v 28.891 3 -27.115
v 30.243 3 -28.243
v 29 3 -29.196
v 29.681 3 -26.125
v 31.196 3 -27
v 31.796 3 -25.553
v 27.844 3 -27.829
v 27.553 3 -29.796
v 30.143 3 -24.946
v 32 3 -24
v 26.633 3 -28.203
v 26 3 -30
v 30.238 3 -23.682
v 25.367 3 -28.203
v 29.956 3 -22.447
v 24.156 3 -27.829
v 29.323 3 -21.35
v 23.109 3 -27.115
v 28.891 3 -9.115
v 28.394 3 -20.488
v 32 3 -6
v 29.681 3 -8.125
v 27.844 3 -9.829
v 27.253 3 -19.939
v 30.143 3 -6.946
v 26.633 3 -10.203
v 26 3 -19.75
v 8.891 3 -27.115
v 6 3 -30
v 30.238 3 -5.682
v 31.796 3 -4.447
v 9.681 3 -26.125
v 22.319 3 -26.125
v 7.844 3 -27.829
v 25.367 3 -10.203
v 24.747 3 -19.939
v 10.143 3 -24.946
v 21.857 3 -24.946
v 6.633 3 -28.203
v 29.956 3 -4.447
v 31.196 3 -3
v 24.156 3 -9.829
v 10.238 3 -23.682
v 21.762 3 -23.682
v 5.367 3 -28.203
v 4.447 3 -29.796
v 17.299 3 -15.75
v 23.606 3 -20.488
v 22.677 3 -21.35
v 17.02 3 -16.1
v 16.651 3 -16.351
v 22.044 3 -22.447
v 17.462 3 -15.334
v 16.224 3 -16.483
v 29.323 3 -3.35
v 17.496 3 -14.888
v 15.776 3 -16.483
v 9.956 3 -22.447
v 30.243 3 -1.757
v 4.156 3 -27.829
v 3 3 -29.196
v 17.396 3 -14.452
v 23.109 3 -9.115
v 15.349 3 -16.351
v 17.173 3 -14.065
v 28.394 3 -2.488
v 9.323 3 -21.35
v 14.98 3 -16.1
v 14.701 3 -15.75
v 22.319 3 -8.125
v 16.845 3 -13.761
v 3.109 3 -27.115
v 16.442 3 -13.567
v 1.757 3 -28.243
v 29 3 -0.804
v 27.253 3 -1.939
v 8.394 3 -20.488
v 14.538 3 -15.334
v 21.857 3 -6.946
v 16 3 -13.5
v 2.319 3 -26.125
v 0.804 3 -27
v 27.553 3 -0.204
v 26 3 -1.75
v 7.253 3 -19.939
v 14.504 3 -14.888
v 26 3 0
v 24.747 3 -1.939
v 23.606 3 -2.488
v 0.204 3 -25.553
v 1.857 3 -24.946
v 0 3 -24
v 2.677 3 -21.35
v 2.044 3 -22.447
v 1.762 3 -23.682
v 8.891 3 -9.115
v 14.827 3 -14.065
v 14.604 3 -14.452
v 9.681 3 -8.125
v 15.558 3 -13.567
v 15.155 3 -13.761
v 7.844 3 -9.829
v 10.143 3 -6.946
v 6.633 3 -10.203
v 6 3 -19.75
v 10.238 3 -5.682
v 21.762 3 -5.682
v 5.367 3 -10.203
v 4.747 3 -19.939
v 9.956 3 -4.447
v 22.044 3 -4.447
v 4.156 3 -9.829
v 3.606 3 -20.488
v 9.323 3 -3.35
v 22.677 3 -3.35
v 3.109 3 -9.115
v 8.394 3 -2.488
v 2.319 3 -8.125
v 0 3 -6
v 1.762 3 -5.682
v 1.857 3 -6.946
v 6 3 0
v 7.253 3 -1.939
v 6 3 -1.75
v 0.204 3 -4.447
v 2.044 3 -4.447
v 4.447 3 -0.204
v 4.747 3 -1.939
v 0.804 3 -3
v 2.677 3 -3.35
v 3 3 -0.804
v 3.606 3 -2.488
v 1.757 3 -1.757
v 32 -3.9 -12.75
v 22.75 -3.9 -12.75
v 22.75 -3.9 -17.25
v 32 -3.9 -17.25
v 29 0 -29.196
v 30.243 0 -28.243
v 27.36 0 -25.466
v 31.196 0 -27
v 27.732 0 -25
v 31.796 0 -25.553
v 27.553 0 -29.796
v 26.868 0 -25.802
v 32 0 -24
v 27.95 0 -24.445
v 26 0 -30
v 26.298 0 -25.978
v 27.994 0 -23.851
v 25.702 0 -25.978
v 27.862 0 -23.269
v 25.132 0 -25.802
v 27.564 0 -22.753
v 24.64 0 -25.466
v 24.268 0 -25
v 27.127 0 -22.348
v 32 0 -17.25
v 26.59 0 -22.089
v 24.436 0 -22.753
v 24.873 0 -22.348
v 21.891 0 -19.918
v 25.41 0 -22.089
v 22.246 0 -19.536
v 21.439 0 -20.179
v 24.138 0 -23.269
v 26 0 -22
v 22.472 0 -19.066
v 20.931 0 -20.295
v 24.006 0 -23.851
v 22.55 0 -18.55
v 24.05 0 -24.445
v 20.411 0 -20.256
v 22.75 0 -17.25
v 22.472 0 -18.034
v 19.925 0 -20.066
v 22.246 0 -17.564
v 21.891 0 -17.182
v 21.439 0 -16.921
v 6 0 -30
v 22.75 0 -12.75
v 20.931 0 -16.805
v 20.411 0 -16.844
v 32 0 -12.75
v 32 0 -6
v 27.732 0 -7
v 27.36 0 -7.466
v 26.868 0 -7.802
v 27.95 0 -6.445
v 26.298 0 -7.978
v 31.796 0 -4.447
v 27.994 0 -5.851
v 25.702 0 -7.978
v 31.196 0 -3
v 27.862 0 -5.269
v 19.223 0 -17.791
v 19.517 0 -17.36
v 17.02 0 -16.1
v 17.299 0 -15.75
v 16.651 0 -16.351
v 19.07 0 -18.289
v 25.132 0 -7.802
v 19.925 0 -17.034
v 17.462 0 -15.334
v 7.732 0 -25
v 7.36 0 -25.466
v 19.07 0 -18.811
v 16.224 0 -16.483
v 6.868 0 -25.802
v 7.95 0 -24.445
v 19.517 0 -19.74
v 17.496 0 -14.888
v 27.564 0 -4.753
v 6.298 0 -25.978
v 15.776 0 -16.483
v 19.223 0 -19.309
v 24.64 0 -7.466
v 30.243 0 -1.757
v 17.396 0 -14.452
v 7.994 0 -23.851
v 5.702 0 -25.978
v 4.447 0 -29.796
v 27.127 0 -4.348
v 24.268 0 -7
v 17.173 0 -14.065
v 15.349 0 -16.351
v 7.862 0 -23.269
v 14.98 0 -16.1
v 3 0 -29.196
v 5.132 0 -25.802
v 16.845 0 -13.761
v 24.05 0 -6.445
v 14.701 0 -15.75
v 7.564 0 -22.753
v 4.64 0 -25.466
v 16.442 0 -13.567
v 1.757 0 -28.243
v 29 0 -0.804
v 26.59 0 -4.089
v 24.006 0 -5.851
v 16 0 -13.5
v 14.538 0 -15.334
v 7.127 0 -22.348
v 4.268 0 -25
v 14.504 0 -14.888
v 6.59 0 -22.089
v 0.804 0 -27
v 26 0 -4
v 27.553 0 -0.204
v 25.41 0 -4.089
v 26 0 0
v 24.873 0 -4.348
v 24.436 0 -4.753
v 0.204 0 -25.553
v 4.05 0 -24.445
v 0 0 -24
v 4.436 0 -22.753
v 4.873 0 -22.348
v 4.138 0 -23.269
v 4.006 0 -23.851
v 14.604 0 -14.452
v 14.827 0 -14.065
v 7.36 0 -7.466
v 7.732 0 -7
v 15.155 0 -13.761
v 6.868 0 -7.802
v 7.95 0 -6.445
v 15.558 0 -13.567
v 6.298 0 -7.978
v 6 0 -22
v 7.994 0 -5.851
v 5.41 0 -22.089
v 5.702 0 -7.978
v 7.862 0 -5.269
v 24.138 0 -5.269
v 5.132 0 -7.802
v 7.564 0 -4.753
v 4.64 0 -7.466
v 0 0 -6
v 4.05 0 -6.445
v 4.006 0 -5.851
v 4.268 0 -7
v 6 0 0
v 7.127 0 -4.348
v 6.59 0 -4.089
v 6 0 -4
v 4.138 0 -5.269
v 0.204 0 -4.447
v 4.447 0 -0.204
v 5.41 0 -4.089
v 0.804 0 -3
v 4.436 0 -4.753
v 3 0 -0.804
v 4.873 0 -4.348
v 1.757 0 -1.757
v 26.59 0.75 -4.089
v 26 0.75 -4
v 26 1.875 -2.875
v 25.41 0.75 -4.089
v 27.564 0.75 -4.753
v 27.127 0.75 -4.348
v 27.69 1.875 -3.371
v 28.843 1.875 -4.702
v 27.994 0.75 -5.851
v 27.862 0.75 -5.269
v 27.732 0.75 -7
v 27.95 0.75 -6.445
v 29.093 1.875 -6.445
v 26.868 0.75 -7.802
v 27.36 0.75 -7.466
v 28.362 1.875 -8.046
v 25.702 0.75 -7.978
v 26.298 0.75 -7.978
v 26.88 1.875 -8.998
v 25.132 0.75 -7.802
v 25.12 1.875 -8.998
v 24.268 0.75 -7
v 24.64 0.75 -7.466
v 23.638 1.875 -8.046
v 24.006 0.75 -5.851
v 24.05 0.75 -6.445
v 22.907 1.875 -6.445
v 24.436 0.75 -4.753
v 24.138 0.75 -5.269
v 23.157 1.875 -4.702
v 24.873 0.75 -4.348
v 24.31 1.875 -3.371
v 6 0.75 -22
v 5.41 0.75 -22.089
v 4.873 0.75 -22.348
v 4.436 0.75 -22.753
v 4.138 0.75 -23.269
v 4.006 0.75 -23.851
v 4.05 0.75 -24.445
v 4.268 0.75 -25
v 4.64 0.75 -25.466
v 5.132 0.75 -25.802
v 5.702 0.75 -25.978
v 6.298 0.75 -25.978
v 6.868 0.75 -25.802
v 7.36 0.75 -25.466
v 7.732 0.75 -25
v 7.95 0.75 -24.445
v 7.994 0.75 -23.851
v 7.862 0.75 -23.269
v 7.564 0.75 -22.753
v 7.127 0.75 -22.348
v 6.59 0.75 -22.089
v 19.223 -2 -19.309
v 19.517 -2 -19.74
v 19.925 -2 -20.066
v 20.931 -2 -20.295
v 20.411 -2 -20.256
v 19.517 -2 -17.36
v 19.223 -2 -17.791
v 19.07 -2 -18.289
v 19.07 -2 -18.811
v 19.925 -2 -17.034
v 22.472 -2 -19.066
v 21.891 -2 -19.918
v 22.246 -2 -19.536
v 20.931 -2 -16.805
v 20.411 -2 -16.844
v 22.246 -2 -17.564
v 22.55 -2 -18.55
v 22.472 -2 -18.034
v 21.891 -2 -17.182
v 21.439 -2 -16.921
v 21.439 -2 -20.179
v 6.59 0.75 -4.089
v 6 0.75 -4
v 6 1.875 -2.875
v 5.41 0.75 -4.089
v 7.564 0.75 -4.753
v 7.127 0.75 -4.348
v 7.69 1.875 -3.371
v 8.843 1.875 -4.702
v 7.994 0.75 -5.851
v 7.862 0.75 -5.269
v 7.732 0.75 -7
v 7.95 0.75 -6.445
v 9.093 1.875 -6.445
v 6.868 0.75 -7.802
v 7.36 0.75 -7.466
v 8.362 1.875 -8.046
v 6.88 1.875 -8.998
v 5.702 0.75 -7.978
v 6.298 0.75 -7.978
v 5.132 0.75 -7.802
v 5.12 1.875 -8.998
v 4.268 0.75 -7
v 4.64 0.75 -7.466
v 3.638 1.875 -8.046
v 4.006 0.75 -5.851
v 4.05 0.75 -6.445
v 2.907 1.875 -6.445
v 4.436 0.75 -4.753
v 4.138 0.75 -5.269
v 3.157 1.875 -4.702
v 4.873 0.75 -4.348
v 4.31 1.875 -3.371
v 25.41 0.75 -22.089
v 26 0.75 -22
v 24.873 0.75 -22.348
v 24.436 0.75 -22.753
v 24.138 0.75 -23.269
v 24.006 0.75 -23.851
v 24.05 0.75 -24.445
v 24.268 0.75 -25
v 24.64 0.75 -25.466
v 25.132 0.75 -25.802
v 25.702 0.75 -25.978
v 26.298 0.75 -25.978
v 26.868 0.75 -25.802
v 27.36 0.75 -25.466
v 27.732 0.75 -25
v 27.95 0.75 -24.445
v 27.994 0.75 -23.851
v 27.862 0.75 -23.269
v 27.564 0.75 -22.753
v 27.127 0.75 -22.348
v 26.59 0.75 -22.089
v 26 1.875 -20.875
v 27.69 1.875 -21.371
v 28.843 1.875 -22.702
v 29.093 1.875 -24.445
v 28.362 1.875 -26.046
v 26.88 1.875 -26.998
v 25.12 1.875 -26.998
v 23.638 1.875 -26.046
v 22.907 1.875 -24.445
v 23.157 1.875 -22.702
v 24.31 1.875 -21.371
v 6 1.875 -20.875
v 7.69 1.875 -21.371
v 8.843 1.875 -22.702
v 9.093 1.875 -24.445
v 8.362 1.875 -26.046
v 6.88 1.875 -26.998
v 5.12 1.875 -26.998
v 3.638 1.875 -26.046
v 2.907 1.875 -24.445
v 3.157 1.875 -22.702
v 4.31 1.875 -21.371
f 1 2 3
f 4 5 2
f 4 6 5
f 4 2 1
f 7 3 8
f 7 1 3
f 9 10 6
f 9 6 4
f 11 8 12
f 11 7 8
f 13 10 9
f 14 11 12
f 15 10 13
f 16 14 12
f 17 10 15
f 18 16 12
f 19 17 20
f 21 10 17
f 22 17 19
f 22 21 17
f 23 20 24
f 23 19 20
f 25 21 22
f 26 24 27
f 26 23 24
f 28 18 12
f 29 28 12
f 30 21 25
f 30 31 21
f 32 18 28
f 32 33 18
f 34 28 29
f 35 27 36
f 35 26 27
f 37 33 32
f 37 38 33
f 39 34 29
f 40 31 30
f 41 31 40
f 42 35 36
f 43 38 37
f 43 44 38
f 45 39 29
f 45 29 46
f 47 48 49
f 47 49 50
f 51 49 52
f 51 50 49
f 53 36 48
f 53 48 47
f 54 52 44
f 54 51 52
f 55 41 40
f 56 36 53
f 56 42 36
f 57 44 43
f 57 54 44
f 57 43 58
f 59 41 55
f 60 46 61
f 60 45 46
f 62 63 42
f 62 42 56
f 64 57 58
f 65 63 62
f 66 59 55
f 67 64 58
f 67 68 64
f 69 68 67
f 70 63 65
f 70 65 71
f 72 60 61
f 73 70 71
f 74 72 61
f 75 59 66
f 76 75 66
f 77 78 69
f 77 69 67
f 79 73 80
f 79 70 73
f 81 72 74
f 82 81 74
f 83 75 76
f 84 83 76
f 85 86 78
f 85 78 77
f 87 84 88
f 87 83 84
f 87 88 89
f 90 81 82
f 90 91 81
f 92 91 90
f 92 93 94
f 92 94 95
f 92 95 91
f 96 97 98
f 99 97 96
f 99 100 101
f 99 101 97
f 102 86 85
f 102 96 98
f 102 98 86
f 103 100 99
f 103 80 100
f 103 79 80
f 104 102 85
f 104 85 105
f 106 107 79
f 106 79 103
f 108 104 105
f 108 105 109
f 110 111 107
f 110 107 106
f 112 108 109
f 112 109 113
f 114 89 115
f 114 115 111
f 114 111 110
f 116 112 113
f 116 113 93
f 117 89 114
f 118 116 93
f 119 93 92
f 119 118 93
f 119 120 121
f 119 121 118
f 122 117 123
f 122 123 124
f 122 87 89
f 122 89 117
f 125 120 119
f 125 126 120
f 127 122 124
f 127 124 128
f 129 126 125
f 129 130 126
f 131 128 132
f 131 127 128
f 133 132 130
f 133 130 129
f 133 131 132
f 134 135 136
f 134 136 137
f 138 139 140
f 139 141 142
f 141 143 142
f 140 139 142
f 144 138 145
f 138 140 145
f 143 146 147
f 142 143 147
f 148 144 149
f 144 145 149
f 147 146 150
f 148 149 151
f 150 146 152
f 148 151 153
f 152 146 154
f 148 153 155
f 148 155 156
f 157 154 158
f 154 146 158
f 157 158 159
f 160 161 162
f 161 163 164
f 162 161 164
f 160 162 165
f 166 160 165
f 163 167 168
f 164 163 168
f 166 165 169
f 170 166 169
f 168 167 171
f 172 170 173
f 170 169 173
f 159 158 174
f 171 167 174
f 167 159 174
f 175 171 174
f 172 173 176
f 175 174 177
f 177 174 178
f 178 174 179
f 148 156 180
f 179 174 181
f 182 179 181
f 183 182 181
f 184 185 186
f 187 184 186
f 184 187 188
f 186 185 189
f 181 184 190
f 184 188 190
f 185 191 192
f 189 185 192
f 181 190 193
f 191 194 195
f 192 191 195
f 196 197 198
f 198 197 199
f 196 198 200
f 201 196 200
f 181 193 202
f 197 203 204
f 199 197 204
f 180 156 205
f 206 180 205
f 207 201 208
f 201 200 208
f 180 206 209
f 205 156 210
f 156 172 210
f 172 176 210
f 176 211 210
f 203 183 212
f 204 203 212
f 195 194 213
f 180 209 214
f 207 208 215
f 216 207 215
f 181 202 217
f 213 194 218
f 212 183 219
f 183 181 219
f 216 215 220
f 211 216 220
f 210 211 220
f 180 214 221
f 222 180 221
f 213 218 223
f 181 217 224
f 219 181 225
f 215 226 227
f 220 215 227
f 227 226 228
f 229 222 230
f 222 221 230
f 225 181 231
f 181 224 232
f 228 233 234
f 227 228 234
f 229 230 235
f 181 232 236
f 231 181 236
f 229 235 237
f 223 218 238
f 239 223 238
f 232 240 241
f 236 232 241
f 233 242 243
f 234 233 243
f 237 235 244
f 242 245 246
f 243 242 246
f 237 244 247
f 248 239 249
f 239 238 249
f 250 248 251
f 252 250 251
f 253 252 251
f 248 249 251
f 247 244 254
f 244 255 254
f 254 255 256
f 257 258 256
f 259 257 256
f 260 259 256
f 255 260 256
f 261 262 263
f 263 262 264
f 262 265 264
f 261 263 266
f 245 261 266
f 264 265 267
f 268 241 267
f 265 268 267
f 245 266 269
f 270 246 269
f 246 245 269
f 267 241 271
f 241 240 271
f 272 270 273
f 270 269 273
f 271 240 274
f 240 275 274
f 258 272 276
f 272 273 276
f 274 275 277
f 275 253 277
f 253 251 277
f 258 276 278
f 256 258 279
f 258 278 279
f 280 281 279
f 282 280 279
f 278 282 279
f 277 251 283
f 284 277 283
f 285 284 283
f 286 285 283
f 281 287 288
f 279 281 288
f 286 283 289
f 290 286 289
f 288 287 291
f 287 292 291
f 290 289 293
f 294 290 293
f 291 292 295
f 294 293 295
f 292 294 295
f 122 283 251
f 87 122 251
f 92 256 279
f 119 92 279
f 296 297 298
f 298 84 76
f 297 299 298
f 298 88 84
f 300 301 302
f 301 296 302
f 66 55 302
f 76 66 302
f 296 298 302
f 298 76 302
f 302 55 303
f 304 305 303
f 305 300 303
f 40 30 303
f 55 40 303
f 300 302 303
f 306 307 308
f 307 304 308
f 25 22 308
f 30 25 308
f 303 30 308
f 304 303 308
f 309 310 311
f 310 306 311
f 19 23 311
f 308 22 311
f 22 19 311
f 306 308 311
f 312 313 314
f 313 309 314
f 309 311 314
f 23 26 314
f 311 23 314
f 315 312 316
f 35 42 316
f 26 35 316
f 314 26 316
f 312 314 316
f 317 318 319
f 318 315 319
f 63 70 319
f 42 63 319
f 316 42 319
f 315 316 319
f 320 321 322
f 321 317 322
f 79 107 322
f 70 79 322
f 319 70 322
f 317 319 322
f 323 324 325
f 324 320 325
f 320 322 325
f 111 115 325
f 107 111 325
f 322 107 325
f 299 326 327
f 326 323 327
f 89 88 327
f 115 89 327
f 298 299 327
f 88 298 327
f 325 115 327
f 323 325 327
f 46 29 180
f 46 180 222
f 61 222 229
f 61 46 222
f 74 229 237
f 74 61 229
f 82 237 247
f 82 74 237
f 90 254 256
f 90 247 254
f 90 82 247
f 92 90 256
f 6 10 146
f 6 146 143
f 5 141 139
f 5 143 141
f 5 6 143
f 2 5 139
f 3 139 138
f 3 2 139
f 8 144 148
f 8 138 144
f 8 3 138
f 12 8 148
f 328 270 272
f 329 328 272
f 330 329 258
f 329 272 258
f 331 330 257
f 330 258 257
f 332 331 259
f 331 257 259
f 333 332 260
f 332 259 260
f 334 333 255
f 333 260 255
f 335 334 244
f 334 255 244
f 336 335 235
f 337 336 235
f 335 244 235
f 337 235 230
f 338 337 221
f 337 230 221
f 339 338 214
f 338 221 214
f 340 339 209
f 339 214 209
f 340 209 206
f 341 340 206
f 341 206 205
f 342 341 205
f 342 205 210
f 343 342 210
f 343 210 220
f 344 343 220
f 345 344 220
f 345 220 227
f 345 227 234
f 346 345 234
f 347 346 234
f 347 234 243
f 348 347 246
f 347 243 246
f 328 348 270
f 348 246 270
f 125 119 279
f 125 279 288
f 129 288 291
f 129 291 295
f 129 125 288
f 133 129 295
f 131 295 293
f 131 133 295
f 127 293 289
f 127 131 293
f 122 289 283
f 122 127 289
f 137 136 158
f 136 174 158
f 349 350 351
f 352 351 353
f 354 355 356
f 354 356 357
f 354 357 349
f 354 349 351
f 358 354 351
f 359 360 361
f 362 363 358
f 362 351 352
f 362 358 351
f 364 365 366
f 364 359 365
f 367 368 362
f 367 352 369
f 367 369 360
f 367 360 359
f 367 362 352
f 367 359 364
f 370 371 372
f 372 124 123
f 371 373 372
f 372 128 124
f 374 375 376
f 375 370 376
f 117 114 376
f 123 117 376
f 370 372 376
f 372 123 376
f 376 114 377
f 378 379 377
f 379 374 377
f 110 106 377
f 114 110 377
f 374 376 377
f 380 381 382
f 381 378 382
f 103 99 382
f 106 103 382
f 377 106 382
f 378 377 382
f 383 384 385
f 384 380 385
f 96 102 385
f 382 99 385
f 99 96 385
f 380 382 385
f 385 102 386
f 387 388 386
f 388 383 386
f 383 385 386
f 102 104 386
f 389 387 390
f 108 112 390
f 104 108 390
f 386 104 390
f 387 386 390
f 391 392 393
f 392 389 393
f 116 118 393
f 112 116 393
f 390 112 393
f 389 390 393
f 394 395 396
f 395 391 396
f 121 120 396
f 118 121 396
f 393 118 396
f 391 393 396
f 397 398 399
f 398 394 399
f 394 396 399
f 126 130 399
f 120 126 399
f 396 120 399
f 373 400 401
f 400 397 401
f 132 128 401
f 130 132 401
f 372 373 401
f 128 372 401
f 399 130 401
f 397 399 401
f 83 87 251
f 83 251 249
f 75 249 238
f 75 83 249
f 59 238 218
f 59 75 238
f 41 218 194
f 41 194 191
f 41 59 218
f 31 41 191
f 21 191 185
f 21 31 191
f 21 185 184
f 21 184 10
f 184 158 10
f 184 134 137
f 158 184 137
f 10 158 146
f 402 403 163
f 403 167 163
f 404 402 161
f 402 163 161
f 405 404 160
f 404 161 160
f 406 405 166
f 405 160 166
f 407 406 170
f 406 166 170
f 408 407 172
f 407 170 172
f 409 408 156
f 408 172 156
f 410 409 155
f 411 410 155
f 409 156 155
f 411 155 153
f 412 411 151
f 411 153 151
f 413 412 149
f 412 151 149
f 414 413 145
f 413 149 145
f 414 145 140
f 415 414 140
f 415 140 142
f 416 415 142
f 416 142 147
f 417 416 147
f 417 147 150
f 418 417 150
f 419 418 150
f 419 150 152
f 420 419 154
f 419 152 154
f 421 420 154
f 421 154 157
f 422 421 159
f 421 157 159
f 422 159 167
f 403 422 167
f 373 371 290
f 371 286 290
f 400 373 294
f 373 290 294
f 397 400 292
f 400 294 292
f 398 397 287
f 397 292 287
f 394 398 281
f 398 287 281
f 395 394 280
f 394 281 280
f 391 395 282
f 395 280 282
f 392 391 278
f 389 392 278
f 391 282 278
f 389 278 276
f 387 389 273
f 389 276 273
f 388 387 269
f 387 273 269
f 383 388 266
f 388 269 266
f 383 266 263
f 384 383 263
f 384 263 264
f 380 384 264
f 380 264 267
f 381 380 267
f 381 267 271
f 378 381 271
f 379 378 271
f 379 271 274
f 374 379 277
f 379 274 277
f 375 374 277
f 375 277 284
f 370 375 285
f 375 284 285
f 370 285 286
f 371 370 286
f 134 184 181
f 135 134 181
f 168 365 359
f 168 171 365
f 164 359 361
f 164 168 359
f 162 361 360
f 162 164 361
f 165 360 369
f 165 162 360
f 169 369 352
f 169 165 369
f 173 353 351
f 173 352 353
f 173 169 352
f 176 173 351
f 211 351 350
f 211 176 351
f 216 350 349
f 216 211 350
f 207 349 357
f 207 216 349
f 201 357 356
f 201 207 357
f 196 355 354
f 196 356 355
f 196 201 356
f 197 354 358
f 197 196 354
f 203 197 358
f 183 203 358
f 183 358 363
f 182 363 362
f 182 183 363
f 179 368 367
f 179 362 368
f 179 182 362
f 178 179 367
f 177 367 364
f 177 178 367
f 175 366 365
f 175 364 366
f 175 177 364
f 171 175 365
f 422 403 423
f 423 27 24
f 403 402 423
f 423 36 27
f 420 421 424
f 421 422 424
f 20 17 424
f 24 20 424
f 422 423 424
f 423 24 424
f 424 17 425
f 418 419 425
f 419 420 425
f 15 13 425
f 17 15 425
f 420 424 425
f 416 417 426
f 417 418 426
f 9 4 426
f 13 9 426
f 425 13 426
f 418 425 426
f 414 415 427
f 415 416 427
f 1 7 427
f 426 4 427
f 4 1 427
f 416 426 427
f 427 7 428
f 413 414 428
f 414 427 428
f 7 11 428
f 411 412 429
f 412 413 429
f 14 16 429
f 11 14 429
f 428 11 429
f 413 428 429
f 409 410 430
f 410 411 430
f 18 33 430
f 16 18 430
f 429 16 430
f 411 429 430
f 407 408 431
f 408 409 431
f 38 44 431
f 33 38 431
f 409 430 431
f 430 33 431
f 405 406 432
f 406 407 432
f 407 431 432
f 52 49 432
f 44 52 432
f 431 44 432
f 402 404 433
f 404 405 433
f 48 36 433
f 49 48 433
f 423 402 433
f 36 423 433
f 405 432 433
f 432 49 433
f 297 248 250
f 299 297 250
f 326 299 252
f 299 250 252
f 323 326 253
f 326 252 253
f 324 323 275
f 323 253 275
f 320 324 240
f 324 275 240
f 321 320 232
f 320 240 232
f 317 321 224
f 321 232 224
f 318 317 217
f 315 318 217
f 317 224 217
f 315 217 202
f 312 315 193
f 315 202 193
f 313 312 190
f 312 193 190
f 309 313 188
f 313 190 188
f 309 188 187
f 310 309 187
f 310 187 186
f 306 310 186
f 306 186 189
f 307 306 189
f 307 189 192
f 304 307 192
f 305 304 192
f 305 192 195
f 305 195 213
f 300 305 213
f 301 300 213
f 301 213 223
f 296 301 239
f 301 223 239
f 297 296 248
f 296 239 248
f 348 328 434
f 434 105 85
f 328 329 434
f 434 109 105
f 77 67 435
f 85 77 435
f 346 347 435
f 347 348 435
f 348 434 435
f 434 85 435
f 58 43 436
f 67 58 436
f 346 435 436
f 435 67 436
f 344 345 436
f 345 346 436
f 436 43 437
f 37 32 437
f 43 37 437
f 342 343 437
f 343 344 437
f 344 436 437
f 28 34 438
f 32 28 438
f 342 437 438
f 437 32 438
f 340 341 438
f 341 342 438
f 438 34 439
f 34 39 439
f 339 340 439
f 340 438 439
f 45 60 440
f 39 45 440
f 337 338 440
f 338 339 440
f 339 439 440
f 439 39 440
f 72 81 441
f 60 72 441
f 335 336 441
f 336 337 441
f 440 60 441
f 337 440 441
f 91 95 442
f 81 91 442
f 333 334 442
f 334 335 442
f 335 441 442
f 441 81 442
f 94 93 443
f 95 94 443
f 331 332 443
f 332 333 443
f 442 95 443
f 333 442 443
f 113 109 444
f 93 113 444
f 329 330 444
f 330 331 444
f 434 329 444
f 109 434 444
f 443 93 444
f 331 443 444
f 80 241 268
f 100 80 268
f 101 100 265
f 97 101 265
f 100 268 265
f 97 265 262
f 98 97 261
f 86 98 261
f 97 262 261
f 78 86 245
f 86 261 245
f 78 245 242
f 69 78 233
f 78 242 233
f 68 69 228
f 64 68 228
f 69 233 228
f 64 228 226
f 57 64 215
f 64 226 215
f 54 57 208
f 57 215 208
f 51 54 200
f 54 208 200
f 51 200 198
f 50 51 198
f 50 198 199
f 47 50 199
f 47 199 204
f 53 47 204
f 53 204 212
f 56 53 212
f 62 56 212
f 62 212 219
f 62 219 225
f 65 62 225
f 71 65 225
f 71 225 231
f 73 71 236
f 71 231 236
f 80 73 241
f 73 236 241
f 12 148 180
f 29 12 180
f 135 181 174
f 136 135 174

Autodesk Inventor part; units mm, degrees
ref_plane "YZ Plane" through (0, 0, 0) normal (1, 0, 0) x (0, 1, 0)
ref_plane "XZ Plane" through (0, 0, 0) normal (0, 1, 0) x (-1, 0, 0)
ref_plane "XY Plane" through (0, 0, 0) normal (0, 0, 1) x (1, 0, 0)
sketch "Sketch1" plane through (0, 0, 0) normal (0, 1, 0) x (-1, 0, 0)
  line L0 (0, 0) -> (-32, 0)
  line L1 (-32, 0) -> (-32, -30)
  line L2 (-32, -30) -> (0, -30)
  line L3 (0, -30) -> (0, 0)
  dimension "d0" = 30
  dimension "d1" = 32
extrude "Extrusion1" add sketch "Sketch1" along normal blind 3
sketch "Sketch2" plane through (0, 3, 0) normal (0, 1, 0) x (1, 0, 0)
  line L0 (32, 30) -> (0, 30) projected
  line L1 (0, 30) -> (0, 0) projected
  line L2 (6, 24) -> (26, 24) construction
  line L3 (26, 24) -> (26, 6) construction
  line L4 (26, 6) -> (6, 6) construction
  line L5 (6, 6) -> (6, 24) construction
  point P0 (0, 15)
  point P1 (6, 15)
  point P2 (16, 24)
  point P3 (16, 30)
  dimension "d4" = 20
  dimension "d5" = 18
hole "Hole1" at (6, 3, -24) at (6, 3, -6) at (26, 3, -6) at (26, 3, -24) direction (0, -1, 0) diameter 4 end through all countersink diameter 8.5 countersink angle 90
sketch "Sketch3" plane through (0, 0, 0) normal (0, -1, 0) x (1, 0, 0)
  line L0 (32, 0) -> (32, -30) projected
  line L1 (32, -12.75) -> (22.75, -12.75)
  line L2 (22.75, -12.75) -> (22.75, -17.25)
  line L3 (22.75, -17.25) -> (32, -17.25)
  line L4 (32, -17.25) -> (32, -12.75)
  point P0 (32, -15)
  point P1 (32, -15)
  dimension "d13" = 9.25
  dimension "d14" = 4.5
extrude "Extrusion2" add sketch "Sketch3" along normal blind 3.9
sketch "Sketch4" plane through (0, 3, 0) normal (0, 1, 0) x (1, 0, 0)
  line L0 (32, 30) -> (0, 30) projected
  line L1 (0, 30) -> (0, 0) projected
  point P0 (16, 15)
  point P1 (0, 15)
  point P2 (16, 30)
hole "Hole2" at (16, 3, -15) direction (0, -1, 0) diameter 3 end through all
sketch "Sketch5" plane through (0, 0, 0) normal (0, -1, 0) x (1, 0, 0)
  line L0 (0, 0) -> (32, 0) projected
  line L1 (0, -30) -> (0, 0) projected
  line L2 (9.25, -9.5) -> (22.75, -9.5) construction
  line L3 (22.75, -9.5) -> (22.75, -20.5) construction
  line L4 (22.75, -20.5) -> (9.25, -20.5) construction
  line L5 (9.25, -20.5) -> (9.25, -9.5) construction
  circle A0 centre (20.8, -18.55) radius 1.75
  point P0 (9.25, -15)
  point P1 (0, -15)
  point P2 (16, -9.5)
  point P3 (16, 0)
  dimension "d25" = 11
  dimension "d26" = 13.5
  dimension "d27" = 3.5
  dimension "d28" = 1.95
  dimension "d29" = 1.95
extrude "Extrusion3" add sketch "Sketch5" along normal blind 2
fillet "Fillet2" radius 6 4 edges at (0, 1.5, 0) (32, 1.5, 0) (0, 1.5, -30) (32, 1.5, -30)
equation "\"d29\" = d28"
properties part number "top"
